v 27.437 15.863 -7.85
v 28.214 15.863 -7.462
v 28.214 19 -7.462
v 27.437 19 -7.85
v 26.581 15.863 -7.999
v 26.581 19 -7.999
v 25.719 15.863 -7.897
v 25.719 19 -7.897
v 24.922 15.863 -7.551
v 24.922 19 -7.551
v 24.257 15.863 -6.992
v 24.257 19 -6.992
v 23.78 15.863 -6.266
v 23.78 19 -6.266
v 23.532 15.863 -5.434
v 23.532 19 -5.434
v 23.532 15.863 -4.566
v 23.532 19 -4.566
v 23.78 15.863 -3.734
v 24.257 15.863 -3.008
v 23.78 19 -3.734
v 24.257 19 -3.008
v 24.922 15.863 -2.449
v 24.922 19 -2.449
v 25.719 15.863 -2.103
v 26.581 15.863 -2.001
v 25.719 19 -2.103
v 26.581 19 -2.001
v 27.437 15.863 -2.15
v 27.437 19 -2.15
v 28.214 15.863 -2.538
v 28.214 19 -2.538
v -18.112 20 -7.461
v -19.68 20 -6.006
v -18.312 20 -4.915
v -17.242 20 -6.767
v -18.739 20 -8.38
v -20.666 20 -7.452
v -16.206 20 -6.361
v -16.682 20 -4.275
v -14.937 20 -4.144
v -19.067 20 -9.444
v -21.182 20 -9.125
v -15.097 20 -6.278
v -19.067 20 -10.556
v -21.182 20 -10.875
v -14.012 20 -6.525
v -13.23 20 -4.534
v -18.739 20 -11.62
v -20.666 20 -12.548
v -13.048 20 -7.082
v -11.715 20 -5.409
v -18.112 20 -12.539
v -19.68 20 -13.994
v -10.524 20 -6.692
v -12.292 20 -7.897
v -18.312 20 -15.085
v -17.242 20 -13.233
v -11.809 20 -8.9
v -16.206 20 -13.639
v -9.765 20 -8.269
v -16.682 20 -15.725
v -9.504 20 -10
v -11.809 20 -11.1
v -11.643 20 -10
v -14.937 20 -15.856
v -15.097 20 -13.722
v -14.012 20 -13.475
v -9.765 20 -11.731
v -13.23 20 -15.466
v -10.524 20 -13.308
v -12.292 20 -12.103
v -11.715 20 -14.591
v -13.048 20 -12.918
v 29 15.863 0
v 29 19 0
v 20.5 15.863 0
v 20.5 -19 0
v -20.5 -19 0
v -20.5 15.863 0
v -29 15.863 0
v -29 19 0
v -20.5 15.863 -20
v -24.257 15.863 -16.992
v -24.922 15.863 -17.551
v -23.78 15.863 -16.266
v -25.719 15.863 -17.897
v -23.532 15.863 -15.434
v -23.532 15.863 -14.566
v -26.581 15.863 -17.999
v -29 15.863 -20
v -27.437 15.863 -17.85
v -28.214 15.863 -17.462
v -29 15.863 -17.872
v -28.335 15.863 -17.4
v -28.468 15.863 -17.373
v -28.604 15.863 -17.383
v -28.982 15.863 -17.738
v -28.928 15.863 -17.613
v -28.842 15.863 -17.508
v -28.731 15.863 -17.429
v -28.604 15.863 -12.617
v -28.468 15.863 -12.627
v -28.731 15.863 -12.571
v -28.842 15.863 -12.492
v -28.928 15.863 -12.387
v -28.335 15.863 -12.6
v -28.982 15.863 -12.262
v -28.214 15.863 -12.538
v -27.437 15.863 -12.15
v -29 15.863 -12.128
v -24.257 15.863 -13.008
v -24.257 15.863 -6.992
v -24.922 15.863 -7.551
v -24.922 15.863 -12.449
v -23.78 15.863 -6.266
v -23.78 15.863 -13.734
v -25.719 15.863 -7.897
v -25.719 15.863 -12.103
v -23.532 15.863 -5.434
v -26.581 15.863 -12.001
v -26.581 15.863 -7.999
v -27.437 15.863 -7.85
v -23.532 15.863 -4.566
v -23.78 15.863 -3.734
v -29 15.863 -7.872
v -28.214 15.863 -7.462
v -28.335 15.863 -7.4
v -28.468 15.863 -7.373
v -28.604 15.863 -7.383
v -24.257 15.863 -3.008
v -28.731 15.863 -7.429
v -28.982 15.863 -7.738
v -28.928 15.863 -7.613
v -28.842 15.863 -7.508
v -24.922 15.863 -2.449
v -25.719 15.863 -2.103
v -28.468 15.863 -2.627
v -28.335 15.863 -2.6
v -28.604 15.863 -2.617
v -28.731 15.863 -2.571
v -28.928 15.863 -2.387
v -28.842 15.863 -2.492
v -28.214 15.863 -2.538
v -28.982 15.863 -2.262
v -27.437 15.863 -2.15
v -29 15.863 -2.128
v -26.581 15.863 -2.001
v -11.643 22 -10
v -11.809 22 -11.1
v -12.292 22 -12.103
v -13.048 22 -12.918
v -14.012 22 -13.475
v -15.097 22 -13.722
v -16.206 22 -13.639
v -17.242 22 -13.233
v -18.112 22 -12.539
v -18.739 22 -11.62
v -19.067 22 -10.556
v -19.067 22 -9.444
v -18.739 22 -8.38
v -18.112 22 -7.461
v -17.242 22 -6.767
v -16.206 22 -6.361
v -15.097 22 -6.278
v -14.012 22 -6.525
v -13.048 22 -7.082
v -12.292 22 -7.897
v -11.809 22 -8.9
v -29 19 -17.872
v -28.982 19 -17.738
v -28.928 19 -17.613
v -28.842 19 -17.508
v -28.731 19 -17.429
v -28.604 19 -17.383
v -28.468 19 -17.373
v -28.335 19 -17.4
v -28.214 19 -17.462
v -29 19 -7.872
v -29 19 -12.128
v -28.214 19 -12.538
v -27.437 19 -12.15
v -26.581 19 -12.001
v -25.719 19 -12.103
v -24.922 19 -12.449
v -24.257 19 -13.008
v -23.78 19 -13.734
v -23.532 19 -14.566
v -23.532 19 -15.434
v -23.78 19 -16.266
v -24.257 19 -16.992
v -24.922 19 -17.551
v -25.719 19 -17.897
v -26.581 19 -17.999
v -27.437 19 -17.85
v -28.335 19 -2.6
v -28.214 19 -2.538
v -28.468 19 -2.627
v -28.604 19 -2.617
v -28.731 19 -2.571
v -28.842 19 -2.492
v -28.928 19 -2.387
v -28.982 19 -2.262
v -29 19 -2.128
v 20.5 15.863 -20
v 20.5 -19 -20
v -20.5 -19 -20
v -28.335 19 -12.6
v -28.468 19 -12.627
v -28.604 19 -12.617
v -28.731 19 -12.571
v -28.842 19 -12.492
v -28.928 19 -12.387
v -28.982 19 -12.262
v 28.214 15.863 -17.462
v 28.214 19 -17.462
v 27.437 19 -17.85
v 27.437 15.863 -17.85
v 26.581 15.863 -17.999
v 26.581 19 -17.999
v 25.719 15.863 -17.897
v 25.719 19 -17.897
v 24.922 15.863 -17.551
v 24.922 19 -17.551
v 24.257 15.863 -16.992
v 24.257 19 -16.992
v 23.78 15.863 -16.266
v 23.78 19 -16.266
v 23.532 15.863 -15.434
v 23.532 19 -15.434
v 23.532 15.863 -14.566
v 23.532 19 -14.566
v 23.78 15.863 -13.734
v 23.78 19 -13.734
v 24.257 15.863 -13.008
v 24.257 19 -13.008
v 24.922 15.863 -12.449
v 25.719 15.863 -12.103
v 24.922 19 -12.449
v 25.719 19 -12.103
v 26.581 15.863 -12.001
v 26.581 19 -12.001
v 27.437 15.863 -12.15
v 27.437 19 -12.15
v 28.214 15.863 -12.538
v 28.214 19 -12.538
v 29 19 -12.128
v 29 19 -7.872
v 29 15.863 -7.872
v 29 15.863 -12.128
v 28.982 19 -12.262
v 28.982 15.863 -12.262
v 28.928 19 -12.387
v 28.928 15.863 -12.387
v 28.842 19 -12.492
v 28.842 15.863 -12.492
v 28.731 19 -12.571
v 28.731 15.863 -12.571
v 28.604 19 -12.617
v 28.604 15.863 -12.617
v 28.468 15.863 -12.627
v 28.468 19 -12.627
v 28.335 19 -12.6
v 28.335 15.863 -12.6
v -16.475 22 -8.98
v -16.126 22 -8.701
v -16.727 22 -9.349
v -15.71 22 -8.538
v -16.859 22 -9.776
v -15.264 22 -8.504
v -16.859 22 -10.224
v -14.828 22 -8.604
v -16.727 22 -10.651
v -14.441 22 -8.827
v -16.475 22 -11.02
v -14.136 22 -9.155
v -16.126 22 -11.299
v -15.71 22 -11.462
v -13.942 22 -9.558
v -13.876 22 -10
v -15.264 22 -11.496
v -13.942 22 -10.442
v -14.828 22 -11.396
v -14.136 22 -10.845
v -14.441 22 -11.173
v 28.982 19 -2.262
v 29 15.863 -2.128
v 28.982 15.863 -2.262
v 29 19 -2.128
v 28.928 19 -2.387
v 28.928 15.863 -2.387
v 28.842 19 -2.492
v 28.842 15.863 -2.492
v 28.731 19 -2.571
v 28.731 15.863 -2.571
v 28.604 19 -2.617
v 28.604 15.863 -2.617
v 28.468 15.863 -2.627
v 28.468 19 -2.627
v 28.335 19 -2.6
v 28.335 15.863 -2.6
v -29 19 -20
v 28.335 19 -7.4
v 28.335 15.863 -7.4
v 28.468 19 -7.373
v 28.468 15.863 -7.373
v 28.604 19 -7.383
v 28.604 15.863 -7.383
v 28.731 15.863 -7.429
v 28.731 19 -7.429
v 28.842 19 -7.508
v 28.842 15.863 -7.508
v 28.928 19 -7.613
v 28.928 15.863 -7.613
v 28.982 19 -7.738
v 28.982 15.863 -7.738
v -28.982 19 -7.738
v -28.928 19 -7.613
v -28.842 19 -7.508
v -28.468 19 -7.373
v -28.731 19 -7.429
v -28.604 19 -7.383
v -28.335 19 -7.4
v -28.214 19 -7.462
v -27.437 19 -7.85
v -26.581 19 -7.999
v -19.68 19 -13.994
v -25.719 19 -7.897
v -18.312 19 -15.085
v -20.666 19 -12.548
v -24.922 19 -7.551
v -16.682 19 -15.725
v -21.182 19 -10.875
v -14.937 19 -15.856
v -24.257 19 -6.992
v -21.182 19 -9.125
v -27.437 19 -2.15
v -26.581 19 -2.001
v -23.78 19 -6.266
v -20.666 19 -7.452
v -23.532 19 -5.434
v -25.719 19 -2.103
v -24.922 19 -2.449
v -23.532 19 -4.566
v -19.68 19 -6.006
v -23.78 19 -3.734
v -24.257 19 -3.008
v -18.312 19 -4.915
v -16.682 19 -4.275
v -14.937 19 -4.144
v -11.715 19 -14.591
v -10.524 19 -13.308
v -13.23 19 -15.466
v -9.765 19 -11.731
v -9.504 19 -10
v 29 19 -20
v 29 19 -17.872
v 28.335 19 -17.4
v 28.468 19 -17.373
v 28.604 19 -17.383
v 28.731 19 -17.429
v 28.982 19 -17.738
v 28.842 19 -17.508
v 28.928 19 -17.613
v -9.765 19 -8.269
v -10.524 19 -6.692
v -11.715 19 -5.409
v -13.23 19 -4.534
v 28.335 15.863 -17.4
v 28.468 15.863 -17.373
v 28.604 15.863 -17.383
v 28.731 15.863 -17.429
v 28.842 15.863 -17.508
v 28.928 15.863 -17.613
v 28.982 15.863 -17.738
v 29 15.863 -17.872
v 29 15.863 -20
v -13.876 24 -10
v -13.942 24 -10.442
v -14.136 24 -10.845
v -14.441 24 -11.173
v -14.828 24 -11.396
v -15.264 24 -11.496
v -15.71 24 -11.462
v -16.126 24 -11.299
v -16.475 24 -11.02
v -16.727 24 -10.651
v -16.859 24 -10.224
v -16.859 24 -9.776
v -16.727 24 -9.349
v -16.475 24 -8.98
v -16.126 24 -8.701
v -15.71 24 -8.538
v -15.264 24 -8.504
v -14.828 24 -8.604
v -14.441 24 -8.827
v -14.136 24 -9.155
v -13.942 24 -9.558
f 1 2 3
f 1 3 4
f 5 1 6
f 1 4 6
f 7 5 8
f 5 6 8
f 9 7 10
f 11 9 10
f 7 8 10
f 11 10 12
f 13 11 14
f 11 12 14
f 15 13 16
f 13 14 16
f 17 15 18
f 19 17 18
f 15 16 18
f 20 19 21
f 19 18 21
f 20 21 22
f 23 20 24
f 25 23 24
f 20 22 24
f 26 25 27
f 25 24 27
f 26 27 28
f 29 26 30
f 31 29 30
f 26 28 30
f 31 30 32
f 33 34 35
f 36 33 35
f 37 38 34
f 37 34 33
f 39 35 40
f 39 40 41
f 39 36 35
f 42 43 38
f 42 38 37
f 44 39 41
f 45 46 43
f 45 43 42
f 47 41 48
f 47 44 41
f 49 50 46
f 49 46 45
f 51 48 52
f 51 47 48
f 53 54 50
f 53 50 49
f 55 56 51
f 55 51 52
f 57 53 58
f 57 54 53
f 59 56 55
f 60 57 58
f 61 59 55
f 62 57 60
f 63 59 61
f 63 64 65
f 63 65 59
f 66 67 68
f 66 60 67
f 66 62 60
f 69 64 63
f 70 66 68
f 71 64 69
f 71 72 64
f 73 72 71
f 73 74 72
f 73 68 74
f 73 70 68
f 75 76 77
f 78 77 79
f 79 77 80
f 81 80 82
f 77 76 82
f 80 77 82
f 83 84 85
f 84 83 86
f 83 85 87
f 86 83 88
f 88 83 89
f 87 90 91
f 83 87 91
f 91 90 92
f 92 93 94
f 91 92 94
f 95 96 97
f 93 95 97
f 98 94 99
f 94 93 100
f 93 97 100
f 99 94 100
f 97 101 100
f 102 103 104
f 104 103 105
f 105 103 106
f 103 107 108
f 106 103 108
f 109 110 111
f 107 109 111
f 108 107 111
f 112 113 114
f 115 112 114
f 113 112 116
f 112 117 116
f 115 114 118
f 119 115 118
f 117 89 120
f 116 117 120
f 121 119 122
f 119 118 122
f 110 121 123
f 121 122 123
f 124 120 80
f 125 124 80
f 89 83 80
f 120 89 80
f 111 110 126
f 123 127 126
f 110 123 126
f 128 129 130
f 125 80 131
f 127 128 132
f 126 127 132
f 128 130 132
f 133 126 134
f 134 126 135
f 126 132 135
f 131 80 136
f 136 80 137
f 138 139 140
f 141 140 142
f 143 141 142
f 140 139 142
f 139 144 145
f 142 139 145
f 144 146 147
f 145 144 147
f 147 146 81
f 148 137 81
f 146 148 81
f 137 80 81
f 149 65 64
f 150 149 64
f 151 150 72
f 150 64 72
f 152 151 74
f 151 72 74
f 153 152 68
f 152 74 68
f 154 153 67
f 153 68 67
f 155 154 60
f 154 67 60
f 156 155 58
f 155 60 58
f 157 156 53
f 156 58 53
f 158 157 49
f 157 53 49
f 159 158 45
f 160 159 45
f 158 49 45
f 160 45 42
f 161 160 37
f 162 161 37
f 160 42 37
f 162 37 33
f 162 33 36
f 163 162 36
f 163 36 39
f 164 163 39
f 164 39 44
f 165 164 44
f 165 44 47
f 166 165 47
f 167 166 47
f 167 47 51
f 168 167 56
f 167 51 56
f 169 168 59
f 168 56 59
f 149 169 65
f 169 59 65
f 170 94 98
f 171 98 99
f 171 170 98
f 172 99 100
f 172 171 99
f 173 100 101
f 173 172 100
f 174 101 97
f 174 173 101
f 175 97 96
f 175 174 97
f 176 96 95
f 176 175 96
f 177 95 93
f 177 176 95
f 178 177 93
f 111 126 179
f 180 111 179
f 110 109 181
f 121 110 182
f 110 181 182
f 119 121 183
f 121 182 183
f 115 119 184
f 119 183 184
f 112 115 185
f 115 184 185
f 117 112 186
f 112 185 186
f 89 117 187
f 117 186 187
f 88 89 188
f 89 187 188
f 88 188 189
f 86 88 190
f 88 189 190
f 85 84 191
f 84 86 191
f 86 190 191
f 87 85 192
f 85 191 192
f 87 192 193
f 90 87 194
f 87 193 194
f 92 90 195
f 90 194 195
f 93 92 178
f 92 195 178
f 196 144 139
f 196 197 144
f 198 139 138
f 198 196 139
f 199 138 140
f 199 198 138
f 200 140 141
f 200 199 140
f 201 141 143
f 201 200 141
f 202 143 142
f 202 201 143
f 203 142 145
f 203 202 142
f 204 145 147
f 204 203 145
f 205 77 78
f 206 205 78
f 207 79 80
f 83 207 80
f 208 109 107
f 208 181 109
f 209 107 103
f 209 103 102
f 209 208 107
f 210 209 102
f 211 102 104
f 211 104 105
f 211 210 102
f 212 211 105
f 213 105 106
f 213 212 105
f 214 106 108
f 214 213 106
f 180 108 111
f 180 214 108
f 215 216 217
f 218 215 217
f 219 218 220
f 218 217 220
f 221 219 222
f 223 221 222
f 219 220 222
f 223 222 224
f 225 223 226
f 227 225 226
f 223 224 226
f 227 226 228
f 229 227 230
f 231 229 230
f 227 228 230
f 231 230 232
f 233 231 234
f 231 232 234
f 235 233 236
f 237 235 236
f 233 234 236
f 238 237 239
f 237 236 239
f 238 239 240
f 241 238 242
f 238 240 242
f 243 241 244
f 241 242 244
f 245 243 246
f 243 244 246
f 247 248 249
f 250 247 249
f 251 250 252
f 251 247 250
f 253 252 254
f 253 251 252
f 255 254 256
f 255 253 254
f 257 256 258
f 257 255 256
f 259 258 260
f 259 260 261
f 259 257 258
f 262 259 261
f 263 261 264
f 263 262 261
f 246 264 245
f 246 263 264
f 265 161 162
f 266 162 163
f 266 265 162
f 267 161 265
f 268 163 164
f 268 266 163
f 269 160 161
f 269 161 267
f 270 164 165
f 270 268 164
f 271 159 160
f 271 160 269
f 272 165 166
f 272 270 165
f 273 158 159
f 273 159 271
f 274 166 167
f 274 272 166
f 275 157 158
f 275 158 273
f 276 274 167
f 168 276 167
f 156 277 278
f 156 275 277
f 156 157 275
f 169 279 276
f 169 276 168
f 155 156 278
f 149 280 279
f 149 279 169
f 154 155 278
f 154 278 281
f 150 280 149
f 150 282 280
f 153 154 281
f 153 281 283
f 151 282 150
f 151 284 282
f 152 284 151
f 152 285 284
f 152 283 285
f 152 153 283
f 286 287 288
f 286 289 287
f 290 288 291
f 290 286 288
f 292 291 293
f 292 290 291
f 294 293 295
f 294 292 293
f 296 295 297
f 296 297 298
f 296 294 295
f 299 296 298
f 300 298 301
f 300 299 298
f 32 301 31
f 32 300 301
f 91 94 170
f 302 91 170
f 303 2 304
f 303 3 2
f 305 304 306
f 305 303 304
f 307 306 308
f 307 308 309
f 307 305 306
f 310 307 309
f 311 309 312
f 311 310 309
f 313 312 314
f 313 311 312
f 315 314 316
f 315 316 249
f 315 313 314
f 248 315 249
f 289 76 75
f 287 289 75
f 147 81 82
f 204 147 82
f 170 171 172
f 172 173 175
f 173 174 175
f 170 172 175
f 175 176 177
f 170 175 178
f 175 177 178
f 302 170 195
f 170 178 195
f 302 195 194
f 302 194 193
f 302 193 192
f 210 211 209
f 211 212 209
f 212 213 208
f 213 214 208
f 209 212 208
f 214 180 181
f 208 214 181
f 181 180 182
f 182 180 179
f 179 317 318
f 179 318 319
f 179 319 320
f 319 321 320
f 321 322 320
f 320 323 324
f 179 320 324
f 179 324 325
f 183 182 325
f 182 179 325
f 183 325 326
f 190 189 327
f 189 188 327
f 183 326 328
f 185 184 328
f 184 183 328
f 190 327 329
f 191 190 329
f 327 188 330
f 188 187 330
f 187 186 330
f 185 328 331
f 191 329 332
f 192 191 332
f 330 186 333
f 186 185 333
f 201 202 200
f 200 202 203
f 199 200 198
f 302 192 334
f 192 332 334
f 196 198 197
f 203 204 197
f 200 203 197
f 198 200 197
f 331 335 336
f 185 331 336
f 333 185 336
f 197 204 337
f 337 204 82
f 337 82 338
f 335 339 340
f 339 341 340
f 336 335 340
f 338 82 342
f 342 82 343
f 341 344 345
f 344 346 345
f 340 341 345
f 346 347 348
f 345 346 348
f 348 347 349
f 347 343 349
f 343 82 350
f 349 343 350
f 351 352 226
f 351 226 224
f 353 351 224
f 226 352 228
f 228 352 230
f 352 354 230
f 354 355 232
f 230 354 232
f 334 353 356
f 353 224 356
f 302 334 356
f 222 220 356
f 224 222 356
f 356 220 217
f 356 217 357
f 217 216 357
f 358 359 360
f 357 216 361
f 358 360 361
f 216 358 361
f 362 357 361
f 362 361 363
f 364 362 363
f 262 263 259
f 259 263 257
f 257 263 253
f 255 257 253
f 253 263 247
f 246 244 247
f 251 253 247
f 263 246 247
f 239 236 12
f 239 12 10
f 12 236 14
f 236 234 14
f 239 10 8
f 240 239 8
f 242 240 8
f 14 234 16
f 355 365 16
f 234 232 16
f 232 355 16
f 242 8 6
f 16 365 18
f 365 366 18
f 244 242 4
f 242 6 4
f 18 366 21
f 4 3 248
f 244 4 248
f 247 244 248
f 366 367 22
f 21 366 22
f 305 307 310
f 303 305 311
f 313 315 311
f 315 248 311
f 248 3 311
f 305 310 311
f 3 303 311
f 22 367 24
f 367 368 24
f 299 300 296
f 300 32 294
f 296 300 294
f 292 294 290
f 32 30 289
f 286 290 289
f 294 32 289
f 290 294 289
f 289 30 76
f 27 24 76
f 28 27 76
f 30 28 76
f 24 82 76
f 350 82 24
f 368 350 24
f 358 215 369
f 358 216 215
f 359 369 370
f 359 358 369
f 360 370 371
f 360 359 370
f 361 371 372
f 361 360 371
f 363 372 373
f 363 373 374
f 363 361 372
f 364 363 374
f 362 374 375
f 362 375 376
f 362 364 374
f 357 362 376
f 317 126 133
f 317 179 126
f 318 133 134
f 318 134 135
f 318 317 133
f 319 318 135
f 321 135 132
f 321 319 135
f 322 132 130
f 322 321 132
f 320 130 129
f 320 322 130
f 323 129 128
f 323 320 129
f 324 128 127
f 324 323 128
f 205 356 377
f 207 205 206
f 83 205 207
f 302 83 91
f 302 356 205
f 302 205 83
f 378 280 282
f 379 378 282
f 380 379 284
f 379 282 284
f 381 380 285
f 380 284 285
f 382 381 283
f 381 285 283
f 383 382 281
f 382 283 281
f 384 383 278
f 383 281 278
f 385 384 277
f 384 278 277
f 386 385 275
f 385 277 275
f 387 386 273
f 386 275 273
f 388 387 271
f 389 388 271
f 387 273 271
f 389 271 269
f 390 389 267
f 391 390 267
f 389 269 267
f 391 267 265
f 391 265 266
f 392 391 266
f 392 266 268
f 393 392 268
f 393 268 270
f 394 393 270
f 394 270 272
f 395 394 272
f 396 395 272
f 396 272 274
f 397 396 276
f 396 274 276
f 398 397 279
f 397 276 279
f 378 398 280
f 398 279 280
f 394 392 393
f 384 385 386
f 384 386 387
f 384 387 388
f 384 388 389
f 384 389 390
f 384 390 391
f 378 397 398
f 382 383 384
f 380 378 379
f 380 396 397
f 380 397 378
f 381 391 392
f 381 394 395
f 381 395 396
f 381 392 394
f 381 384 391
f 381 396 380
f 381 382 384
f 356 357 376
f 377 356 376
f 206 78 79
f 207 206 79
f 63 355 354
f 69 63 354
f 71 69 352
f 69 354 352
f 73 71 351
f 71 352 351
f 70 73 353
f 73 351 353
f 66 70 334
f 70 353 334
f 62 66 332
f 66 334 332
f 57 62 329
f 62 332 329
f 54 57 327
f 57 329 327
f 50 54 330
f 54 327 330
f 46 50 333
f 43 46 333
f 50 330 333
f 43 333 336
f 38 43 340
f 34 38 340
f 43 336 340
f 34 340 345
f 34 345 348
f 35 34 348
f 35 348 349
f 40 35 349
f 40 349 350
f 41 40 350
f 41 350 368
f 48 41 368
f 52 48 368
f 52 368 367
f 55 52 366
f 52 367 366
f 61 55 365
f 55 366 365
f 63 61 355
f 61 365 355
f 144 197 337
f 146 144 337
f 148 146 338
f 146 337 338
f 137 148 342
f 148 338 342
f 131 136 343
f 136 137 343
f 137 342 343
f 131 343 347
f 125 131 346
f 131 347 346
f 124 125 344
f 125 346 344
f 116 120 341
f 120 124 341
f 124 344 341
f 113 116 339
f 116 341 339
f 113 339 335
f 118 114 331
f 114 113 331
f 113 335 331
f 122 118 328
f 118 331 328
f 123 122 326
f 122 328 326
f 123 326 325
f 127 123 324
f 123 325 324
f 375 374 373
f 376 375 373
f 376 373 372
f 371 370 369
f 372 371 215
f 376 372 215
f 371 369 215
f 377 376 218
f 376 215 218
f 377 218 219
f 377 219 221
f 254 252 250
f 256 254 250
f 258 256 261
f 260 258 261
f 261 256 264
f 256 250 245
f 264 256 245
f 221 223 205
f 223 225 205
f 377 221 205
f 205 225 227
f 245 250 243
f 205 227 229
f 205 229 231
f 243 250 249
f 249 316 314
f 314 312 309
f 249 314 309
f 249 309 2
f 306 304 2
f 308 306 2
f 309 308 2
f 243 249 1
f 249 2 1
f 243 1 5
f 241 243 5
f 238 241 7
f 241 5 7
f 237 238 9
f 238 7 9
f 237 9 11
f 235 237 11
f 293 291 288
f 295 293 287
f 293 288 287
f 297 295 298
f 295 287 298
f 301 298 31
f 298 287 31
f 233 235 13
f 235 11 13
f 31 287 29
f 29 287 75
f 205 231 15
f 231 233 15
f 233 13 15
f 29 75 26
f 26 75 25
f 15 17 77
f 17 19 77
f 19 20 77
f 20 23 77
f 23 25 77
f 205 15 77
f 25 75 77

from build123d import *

# Parameters (mm, degrees)
BOSS_EXTRUDE1_DEPTH = 20
SKETCH2_R           = 3
CUT_EXTRUDE2_DEPTH  = 39
FILLET1_R           = 0.5
SKETCH4_R           = 5.872078672
BOSS_EXTRUDE2_DEPTH = 1
SKETCH5_R           = 3.732814836
BOSS_EXTRUDE3_DEPTH = 2
SKETCH8_R           = 1.5
BOSS_EXTRUDE4_DEPTH = 2


with BuildPart() as part:
    # Sketch1 → Boss-Extrude1 (new body)
    with BuildSketch(Plane.XY):
        Polygon((-29, 19), (29, 19), (29, 15.862733035), (20.5, 15.862733035), (20.5, -19), (-20.5, -19), (-20.5, 15.862733035), (-29, 15.862733035), align=None)
    extrude(amount=-BOSS_EXTRUDE1_DEPTH)

    # Sketch2 → Cut-Extrude2 (cut, through all)
    with BuildSketch(Plane(origin=(0, 19, 0), x_dir=(1, 0, 0), z_dir=(0, 1, 0))):
        with Locations((26.5, 5)):
            Circle(SKETCH2_R)
        with Locations((26.5, 15)):
            Circle(SKETCH2_R)
        with Locations((-26.5, 5)):
            Circle(SKETCH2_R)
        with Locations((-26.5, 15)):
            Circle(SKETCH2_R)
    extrude(amount=-CUT_EXTRUDE2_DEPTH, mode=Mode.SUBTRACT)

    # Fillet1
    fillet1_edges = [part.edges().sort_by_distance(p)[0] for p in [
        (29, 17.431366518, -3.341687605),
        (29, 17.431366518, -6.658312395),
        (29, 17.431366518, -13.341687605),
        (29, 17.431366518, -16.658312395),
        (-29, 17.431366518, -3.341687605),
        (-29, 17.431366518, -6.658312395),
        (-29, 17.431366518, -13.341687605),
        (-29, 17.431366518, -16.658312395),
    ]]
    fillet(fillet1_edges, radius=FILLET1_R)

    # Sketch4 → Boss-Extrude2 (add)
    with BuildSketch(Plane(origin=(0, 19, 0), x_dir=(1, 0, 0), z_dir=(0, 1, 0))):
        with Locations((-15.375793184, 10)):
            Circle(SKETCH4_R)
    extrude(amount=BOSS_EXTRUDE2_DEPTH)

    # Sketch5 → Boss-Extrude3 (add)
    with BuildSketch(Plane(origin=(0, 20, 0), x_dir=(1, 0, 0), z_dir=(0, 1, 0))):
        with Locations((-15.375793184, 10)):
            Circle(SKETCH5_R)
    extrude(amount=BOSS_EXTRUDE3_DEPTH)

    # Sketch8 → Boss-Extrude4 (add)
    with BuildSketch(Plane(origin=(0, 22, 0), x_dir=(1, 0, 0), z_dir=(0, 1, 0))):
        with Locations((-15.375793184, 10)):
            Circle(SKETCH8_R)
    extrude(amount=BOSS_EXTRUDE4_DEPTH)


solid = part.part
